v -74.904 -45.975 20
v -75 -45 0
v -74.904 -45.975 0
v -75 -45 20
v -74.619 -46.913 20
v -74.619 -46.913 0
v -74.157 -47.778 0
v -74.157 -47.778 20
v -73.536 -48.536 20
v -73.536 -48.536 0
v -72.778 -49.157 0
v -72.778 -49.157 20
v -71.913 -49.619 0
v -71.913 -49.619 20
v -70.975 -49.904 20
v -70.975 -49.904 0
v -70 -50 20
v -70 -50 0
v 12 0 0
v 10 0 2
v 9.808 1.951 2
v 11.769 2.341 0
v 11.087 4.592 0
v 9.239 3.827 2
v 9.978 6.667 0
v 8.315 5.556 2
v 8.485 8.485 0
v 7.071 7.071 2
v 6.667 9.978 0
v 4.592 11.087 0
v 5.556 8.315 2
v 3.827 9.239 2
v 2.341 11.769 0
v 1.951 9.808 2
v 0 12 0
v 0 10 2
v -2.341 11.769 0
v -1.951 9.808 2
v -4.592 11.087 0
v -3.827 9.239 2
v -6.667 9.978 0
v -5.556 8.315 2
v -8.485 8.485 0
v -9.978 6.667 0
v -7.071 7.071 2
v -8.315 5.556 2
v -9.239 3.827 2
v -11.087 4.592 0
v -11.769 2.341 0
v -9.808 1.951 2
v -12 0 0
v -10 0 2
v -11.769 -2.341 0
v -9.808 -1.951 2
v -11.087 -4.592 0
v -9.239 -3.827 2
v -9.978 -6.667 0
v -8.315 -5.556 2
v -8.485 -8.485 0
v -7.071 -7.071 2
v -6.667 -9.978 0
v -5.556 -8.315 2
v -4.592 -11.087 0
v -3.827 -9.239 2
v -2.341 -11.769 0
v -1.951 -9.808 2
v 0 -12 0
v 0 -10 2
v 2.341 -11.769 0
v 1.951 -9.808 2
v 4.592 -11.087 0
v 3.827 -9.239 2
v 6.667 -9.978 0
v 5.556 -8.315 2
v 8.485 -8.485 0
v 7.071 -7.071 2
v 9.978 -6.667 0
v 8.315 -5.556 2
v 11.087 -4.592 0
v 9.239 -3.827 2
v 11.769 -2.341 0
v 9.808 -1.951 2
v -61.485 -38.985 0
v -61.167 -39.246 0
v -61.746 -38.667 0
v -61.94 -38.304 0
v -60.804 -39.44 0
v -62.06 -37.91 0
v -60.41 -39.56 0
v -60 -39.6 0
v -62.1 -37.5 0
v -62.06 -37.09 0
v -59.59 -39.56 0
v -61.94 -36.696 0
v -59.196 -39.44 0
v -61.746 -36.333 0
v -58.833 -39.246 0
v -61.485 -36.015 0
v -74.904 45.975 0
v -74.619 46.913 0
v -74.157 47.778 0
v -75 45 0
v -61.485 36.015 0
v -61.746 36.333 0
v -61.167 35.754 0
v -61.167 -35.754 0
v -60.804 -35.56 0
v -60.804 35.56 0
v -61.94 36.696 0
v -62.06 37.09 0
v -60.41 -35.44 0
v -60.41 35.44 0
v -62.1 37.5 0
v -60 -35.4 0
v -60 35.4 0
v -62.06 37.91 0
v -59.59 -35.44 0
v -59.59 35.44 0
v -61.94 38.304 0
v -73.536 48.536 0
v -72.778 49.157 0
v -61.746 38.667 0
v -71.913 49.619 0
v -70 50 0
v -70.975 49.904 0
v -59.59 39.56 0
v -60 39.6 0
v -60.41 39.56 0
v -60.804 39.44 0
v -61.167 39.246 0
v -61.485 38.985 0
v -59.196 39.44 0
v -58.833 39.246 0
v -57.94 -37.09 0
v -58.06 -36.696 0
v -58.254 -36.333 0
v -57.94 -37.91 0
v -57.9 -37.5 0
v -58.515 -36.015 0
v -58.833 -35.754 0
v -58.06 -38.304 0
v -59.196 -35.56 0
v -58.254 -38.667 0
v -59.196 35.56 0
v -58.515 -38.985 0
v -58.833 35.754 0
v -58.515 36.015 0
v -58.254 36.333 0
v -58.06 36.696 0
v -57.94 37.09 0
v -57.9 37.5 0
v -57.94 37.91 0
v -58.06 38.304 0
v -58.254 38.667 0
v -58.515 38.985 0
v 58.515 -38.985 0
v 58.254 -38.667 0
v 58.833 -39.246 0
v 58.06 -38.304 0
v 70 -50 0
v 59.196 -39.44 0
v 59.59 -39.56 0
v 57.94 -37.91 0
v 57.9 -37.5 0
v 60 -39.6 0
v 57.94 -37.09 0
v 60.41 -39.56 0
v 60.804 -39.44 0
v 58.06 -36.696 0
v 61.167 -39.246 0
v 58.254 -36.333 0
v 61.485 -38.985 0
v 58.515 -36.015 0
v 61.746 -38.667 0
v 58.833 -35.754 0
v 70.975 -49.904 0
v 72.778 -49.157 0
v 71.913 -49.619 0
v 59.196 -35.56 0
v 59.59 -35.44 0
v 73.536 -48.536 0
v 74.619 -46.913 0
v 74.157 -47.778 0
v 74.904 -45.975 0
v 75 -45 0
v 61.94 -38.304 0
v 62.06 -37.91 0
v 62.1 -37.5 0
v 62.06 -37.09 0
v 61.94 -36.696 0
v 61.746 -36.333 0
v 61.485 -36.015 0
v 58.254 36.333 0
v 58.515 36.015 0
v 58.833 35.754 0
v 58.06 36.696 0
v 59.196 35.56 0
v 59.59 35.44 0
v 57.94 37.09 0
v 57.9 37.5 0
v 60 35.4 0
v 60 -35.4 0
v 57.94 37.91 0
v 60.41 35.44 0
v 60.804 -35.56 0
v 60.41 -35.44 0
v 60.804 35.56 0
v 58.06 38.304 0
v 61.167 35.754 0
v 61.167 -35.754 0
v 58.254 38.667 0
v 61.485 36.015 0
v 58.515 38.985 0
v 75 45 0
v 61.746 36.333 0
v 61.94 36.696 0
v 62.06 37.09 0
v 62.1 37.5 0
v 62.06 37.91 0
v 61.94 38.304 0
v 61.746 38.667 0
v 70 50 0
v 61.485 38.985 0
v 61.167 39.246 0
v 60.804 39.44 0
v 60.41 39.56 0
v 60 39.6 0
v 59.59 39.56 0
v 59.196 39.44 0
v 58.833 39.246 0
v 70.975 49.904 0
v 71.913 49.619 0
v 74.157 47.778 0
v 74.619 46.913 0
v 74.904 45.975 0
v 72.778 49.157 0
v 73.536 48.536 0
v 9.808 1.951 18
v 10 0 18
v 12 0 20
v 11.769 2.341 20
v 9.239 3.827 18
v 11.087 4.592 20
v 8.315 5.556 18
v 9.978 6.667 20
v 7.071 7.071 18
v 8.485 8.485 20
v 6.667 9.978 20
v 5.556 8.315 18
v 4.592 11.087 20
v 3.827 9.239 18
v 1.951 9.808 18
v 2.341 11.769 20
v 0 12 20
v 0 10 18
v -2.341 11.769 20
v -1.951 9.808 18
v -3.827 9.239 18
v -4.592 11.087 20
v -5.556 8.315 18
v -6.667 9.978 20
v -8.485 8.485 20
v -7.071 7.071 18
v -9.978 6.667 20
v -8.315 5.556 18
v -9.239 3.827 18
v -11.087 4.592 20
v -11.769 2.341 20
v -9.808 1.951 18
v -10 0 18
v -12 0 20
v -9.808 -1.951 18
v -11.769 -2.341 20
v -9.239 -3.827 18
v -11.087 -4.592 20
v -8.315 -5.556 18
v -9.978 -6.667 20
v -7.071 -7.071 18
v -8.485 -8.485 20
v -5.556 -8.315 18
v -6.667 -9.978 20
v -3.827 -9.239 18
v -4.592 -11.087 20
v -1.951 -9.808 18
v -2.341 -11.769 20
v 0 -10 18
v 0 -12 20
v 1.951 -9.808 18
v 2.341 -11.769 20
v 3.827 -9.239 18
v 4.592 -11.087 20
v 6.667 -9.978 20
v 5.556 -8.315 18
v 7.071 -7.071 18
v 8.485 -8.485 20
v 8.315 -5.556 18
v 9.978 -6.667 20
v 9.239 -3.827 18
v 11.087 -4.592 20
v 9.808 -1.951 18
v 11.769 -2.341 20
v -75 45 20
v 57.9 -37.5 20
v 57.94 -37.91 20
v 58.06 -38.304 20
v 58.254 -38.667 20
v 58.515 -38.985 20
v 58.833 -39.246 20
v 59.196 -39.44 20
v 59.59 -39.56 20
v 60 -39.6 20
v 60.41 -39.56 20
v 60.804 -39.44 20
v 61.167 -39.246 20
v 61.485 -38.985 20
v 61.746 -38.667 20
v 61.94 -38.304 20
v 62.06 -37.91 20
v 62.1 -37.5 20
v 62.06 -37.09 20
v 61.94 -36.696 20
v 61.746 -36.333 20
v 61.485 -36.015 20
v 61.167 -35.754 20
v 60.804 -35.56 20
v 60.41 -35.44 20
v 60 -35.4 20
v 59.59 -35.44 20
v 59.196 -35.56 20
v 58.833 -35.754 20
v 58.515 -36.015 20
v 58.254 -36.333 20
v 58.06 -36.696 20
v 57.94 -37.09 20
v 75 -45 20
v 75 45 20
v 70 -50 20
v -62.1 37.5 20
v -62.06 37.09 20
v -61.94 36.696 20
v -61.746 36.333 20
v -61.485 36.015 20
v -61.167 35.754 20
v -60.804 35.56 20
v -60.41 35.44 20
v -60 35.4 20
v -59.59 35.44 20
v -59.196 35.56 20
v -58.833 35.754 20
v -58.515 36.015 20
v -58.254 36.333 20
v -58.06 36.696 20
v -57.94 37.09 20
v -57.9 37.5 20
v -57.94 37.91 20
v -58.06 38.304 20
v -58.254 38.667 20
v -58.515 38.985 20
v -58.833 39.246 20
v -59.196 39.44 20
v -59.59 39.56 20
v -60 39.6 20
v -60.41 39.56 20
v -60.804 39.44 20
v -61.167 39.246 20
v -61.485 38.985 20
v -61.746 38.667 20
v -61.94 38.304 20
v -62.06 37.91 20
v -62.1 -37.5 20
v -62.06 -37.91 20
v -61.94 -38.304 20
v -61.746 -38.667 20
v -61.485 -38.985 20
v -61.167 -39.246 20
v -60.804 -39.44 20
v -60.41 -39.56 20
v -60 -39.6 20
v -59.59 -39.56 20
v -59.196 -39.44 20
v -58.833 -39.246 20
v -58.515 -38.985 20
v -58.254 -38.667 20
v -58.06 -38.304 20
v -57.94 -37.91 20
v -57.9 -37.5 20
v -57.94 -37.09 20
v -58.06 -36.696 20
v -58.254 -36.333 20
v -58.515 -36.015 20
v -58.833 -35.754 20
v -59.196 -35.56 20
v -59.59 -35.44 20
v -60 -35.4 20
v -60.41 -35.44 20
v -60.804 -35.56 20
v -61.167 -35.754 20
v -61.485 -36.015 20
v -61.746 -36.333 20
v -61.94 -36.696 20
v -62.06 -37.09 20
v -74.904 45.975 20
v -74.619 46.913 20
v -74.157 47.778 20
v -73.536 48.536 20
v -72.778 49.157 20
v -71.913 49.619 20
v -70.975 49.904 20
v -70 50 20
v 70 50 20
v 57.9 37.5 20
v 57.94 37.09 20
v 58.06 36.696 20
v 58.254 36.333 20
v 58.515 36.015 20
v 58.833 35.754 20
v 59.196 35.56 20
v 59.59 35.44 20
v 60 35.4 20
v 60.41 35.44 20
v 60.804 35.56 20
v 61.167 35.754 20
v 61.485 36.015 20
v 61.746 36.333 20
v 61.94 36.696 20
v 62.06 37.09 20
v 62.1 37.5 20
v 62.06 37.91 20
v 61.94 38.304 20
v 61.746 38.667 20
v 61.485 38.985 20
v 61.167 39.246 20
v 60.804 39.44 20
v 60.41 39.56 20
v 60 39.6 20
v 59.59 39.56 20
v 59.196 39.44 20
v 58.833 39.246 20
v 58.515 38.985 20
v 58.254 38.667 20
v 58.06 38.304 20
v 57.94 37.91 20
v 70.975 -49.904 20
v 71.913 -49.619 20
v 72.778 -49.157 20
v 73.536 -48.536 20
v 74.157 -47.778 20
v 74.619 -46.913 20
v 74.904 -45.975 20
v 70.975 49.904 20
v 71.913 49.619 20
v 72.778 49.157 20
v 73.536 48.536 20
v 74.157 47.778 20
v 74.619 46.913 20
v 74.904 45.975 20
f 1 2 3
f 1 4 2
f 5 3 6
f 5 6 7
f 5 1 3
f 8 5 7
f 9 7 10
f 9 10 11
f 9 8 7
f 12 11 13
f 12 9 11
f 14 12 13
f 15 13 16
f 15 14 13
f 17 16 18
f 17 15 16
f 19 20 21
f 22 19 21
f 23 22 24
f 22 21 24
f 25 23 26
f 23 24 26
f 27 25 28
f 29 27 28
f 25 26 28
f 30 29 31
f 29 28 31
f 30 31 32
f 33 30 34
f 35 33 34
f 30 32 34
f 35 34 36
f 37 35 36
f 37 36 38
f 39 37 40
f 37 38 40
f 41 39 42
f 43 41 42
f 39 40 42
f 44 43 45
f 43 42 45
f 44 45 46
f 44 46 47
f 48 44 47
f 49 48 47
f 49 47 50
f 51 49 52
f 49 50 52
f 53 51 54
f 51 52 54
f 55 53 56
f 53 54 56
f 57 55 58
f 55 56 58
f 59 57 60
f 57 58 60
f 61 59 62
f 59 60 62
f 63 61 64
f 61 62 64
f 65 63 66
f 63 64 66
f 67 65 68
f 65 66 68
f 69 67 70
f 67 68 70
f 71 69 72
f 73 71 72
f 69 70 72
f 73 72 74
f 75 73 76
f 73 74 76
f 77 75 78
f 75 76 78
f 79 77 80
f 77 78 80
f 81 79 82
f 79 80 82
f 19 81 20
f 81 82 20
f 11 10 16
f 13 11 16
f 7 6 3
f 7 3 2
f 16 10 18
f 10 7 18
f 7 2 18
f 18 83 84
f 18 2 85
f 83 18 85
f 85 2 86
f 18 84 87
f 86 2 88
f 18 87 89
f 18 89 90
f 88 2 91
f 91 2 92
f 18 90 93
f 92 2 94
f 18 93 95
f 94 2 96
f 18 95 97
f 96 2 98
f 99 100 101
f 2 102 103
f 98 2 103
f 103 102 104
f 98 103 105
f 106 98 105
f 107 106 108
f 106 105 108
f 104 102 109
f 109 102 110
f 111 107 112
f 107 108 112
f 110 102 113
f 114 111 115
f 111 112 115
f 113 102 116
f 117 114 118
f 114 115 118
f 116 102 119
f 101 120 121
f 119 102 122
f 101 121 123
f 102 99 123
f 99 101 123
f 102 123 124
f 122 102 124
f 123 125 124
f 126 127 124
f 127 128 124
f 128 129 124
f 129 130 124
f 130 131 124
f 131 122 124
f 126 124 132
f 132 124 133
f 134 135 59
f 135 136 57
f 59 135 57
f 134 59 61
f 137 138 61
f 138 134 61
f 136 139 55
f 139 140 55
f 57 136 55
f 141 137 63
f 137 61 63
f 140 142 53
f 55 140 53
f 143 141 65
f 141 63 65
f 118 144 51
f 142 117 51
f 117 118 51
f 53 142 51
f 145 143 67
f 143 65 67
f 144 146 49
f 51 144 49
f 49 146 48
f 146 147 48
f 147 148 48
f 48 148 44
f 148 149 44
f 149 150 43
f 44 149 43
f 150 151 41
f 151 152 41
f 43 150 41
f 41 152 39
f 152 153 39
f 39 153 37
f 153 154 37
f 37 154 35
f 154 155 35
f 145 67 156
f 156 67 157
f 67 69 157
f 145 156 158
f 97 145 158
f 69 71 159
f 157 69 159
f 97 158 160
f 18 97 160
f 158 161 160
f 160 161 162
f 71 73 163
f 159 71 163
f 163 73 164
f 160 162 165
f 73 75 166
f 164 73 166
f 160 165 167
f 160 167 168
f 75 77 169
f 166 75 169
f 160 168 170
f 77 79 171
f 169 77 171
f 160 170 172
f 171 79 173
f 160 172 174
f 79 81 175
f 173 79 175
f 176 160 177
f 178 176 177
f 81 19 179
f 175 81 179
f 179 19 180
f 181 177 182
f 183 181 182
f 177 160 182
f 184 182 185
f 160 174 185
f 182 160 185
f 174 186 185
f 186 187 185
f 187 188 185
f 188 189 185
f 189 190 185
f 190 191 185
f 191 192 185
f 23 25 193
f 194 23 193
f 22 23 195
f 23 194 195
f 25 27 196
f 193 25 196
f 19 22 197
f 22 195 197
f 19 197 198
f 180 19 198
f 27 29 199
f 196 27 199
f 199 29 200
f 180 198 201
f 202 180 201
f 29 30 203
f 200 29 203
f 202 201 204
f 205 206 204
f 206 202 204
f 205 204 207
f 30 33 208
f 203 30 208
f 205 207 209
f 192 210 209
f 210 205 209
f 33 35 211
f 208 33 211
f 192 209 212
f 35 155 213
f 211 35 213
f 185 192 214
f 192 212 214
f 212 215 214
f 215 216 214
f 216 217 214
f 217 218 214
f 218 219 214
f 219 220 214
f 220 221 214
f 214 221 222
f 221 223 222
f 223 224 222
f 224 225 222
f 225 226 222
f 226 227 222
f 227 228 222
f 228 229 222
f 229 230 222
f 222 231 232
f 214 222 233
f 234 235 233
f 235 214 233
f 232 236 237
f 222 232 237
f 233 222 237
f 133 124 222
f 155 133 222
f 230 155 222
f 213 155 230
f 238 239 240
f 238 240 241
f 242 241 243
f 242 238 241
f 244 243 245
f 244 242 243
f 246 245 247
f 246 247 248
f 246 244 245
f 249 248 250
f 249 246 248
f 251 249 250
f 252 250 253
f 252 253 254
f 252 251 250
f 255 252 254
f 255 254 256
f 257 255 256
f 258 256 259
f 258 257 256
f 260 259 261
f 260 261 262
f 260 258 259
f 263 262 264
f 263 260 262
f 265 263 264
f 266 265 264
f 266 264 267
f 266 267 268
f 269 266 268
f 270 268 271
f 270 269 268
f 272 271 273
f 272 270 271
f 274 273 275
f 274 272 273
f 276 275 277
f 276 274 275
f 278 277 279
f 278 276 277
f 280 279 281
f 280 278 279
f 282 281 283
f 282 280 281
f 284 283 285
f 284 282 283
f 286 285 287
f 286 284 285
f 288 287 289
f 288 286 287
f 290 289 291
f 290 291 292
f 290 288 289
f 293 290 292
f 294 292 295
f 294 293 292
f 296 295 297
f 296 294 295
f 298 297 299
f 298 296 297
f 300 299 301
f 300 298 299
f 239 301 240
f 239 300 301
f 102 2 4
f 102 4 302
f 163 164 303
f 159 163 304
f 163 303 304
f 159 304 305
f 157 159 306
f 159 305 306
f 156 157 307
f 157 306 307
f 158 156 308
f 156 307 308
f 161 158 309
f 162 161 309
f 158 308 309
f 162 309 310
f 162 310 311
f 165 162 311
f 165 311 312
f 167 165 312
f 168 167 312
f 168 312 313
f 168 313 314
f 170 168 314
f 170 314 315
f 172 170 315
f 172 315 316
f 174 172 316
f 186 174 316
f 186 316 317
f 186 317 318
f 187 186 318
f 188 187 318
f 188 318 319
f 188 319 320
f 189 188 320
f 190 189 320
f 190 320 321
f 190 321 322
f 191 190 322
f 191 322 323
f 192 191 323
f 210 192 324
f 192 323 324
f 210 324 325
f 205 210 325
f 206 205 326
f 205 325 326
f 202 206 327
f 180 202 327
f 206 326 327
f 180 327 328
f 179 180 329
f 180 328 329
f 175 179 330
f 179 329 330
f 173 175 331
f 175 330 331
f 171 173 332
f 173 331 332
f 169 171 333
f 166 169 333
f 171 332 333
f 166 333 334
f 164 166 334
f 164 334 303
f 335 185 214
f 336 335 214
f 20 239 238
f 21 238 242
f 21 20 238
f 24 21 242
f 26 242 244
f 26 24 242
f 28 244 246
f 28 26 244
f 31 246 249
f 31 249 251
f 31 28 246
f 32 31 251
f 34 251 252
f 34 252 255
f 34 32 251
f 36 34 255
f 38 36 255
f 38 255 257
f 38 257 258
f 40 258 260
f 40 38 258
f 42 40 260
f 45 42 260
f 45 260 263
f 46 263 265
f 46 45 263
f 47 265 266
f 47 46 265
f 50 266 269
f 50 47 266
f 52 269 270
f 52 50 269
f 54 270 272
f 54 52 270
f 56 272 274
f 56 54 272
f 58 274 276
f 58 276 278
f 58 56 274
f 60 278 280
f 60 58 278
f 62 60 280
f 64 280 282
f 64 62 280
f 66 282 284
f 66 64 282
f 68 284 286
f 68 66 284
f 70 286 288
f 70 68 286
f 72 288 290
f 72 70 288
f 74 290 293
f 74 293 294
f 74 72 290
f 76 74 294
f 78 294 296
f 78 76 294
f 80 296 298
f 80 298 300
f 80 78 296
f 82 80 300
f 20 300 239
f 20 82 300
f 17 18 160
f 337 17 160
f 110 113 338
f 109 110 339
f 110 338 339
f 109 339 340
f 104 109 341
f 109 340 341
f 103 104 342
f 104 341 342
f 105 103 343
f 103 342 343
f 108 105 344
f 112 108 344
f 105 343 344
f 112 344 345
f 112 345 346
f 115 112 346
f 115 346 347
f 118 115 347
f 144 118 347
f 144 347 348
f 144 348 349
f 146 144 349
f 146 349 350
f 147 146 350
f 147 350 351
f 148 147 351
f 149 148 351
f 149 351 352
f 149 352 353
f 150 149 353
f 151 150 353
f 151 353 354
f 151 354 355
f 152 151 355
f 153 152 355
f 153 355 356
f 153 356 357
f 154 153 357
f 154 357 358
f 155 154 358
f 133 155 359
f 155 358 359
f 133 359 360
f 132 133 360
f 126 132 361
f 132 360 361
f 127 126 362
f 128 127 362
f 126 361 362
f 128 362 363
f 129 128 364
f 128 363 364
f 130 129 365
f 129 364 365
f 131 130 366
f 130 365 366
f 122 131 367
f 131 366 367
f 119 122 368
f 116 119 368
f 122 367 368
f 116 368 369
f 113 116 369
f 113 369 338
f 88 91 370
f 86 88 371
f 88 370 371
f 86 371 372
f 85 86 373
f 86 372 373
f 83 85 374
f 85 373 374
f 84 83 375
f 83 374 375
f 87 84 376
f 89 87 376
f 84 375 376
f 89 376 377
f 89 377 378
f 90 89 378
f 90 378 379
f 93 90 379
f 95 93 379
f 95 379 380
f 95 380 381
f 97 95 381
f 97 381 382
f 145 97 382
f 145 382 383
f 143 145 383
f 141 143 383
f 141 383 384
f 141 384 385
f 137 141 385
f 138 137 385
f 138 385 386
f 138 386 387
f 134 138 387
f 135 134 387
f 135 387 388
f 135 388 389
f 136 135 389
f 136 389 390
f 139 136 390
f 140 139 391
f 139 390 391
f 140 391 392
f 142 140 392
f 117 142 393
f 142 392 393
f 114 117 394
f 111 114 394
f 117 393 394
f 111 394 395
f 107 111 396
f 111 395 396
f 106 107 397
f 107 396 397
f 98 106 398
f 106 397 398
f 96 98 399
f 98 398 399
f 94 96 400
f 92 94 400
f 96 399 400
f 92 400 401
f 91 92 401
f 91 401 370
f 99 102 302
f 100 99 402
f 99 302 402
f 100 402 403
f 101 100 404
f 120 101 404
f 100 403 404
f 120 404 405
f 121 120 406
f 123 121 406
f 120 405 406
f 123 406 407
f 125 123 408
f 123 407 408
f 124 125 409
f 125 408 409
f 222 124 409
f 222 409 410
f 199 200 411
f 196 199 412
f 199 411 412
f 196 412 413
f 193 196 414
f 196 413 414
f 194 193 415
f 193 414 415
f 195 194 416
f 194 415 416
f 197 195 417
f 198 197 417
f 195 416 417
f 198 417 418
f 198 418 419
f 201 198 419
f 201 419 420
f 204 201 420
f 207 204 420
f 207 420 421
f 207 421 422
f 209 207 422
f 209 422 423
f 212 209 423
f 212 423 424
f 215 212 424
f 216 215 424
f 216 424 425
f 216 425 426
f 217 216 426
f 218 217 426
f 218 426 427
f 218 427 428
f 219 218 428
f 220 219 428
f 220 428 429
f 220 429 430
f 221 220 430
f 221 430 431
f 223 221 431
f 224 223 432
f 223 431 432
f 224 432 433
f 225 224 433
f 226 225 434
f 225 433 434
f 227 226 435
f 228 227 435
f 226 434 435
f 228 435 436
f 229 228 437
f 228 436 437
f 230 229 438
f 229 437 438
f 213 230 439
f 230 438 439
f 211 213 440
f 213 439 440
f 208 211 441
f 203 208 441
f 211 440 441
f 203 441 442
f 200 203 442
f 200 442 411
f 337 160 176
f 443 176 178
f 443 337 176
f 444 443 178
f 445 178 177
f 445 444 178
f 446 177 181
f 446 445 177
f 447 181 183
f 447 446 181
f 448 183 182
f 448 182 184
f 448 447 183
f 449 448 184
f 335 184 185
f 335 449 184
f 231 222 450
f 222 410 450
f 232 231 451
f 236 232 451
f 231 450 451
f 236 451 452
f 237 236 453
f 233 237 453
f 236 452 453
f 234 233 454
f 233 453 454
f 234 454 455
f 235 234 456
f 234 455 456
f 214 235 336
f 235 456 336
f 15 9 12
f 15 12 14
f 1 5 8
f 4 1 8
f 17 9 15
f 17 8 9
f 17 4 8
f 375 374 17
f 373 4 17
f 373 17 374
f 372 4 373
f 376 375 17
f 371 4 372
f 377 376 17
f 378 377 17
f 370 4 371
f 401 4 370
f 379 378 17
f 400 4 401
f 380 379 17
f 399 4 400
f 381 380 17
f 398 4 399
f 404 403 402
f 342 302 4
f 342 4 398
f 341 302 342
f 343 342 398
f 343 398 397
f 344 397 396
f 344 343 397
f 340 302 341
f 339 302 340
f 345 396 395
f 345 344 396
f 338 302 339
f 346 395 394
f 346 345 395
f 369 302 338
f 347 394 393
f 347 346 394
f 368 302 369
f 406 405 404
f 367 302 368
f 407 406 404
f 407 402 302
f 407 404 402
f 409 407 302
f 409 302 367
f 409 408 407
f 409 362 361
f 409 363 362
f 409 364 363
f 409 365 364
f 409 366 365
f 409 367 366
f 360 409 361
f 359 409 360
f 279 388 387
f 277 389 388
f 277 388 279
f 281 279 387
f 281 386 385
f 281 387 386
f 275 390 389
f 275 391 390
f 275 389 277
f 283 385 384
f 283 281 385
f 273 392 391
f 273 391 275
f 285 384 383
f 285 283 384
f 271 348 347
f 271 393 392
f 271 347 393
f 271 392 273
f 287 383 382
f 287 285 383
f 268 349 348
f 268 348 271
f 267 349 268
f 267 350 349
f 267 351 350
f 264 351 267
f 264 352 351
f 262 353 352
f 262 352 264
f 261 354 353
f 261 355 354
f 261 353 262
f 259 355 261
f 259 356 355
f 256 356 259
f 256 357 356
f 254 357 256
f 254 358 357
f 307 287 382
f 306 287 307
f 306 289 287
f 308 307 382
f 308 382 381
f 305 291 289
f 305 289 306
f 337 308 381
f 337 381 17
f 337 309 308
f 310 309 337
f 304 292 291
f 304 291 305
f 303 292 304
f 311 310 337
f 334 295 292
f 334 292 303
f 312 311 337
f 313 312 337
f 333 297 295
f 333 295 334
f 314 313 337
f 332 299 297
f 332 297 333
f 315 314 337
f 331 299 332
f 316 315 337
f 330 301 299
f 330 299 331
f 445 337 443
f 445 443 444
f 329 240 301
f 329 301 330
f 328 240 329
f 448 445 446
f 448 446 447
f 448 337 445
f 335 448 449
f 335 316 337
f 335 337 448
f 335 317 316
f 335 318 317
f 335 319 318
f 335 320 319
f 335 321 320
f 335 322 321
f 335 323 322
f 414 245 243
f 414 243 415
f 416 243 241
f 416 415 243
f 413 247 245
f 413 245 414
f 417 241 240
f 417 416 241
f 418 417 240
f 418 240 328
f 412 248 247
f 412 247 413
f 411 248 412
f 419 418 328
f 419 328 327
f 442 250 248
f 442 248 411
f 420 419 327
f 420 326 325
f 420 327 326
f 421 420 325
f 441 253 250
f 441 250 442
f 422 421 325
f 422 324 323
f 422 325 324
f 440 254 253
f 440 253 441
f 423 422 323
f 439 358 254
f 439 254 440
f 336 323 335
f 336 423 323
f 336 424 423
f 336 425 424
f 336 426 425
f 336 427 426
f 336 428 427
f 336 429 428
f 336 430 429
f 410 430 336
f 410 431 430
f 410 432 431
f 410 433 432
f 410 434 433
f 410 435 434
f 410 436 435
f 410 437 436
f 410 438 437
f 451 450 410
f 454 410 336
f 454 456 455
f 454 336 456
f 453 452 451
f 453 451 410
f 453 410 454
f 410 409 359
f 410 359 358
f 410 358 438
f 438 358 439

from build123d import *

# Parameters (mm, degrees)
F0_W     = 150
F0_H     = 100
F0_R     = 10
F1_DEPTH = 20
F2_R     = 5
F3_SIZE  = 2
F5_D     = 4.2


with BuildPart() as f1:
    # F0 (on Top) → F1 (new body)
    with BuildSketch(Plane.XY):
        Rectangle(F0_W, F0_H)
        Circle(F0_R, mode=Mode.SUBTRACT)
    extrude(amount=F1_DEPTH)

    # F2
    f2_edges = [f1.edges().sort_by_distance(p)[0] for p in [
        (-75, -50, 10),
        (-75, 50, 10),
        (75, -50, 10),
        (75, 50, 10),
    ]]
    fillet(f2_edges, radius=F2_R)

    # F3
    f3_edges = [f1.edges().sort_by_distance(p)[0] for p in [
        (-10, 0, 0),
        (-10, 0, 20),
    ]]
    chamfer(f3_edges, length=F3_SIZE)

    # F5 (through all)
    with Locations(Plane(origin=(0, 0, 0), x_dir=(1, 0, 0), z_dir=(0, 0, -1))):
        with Locations((60, -37.5), (-60, -37.5), (-60, 37.5), (60, 37.5)):
            Hole(F5_D / 2)


solid = f1.part
